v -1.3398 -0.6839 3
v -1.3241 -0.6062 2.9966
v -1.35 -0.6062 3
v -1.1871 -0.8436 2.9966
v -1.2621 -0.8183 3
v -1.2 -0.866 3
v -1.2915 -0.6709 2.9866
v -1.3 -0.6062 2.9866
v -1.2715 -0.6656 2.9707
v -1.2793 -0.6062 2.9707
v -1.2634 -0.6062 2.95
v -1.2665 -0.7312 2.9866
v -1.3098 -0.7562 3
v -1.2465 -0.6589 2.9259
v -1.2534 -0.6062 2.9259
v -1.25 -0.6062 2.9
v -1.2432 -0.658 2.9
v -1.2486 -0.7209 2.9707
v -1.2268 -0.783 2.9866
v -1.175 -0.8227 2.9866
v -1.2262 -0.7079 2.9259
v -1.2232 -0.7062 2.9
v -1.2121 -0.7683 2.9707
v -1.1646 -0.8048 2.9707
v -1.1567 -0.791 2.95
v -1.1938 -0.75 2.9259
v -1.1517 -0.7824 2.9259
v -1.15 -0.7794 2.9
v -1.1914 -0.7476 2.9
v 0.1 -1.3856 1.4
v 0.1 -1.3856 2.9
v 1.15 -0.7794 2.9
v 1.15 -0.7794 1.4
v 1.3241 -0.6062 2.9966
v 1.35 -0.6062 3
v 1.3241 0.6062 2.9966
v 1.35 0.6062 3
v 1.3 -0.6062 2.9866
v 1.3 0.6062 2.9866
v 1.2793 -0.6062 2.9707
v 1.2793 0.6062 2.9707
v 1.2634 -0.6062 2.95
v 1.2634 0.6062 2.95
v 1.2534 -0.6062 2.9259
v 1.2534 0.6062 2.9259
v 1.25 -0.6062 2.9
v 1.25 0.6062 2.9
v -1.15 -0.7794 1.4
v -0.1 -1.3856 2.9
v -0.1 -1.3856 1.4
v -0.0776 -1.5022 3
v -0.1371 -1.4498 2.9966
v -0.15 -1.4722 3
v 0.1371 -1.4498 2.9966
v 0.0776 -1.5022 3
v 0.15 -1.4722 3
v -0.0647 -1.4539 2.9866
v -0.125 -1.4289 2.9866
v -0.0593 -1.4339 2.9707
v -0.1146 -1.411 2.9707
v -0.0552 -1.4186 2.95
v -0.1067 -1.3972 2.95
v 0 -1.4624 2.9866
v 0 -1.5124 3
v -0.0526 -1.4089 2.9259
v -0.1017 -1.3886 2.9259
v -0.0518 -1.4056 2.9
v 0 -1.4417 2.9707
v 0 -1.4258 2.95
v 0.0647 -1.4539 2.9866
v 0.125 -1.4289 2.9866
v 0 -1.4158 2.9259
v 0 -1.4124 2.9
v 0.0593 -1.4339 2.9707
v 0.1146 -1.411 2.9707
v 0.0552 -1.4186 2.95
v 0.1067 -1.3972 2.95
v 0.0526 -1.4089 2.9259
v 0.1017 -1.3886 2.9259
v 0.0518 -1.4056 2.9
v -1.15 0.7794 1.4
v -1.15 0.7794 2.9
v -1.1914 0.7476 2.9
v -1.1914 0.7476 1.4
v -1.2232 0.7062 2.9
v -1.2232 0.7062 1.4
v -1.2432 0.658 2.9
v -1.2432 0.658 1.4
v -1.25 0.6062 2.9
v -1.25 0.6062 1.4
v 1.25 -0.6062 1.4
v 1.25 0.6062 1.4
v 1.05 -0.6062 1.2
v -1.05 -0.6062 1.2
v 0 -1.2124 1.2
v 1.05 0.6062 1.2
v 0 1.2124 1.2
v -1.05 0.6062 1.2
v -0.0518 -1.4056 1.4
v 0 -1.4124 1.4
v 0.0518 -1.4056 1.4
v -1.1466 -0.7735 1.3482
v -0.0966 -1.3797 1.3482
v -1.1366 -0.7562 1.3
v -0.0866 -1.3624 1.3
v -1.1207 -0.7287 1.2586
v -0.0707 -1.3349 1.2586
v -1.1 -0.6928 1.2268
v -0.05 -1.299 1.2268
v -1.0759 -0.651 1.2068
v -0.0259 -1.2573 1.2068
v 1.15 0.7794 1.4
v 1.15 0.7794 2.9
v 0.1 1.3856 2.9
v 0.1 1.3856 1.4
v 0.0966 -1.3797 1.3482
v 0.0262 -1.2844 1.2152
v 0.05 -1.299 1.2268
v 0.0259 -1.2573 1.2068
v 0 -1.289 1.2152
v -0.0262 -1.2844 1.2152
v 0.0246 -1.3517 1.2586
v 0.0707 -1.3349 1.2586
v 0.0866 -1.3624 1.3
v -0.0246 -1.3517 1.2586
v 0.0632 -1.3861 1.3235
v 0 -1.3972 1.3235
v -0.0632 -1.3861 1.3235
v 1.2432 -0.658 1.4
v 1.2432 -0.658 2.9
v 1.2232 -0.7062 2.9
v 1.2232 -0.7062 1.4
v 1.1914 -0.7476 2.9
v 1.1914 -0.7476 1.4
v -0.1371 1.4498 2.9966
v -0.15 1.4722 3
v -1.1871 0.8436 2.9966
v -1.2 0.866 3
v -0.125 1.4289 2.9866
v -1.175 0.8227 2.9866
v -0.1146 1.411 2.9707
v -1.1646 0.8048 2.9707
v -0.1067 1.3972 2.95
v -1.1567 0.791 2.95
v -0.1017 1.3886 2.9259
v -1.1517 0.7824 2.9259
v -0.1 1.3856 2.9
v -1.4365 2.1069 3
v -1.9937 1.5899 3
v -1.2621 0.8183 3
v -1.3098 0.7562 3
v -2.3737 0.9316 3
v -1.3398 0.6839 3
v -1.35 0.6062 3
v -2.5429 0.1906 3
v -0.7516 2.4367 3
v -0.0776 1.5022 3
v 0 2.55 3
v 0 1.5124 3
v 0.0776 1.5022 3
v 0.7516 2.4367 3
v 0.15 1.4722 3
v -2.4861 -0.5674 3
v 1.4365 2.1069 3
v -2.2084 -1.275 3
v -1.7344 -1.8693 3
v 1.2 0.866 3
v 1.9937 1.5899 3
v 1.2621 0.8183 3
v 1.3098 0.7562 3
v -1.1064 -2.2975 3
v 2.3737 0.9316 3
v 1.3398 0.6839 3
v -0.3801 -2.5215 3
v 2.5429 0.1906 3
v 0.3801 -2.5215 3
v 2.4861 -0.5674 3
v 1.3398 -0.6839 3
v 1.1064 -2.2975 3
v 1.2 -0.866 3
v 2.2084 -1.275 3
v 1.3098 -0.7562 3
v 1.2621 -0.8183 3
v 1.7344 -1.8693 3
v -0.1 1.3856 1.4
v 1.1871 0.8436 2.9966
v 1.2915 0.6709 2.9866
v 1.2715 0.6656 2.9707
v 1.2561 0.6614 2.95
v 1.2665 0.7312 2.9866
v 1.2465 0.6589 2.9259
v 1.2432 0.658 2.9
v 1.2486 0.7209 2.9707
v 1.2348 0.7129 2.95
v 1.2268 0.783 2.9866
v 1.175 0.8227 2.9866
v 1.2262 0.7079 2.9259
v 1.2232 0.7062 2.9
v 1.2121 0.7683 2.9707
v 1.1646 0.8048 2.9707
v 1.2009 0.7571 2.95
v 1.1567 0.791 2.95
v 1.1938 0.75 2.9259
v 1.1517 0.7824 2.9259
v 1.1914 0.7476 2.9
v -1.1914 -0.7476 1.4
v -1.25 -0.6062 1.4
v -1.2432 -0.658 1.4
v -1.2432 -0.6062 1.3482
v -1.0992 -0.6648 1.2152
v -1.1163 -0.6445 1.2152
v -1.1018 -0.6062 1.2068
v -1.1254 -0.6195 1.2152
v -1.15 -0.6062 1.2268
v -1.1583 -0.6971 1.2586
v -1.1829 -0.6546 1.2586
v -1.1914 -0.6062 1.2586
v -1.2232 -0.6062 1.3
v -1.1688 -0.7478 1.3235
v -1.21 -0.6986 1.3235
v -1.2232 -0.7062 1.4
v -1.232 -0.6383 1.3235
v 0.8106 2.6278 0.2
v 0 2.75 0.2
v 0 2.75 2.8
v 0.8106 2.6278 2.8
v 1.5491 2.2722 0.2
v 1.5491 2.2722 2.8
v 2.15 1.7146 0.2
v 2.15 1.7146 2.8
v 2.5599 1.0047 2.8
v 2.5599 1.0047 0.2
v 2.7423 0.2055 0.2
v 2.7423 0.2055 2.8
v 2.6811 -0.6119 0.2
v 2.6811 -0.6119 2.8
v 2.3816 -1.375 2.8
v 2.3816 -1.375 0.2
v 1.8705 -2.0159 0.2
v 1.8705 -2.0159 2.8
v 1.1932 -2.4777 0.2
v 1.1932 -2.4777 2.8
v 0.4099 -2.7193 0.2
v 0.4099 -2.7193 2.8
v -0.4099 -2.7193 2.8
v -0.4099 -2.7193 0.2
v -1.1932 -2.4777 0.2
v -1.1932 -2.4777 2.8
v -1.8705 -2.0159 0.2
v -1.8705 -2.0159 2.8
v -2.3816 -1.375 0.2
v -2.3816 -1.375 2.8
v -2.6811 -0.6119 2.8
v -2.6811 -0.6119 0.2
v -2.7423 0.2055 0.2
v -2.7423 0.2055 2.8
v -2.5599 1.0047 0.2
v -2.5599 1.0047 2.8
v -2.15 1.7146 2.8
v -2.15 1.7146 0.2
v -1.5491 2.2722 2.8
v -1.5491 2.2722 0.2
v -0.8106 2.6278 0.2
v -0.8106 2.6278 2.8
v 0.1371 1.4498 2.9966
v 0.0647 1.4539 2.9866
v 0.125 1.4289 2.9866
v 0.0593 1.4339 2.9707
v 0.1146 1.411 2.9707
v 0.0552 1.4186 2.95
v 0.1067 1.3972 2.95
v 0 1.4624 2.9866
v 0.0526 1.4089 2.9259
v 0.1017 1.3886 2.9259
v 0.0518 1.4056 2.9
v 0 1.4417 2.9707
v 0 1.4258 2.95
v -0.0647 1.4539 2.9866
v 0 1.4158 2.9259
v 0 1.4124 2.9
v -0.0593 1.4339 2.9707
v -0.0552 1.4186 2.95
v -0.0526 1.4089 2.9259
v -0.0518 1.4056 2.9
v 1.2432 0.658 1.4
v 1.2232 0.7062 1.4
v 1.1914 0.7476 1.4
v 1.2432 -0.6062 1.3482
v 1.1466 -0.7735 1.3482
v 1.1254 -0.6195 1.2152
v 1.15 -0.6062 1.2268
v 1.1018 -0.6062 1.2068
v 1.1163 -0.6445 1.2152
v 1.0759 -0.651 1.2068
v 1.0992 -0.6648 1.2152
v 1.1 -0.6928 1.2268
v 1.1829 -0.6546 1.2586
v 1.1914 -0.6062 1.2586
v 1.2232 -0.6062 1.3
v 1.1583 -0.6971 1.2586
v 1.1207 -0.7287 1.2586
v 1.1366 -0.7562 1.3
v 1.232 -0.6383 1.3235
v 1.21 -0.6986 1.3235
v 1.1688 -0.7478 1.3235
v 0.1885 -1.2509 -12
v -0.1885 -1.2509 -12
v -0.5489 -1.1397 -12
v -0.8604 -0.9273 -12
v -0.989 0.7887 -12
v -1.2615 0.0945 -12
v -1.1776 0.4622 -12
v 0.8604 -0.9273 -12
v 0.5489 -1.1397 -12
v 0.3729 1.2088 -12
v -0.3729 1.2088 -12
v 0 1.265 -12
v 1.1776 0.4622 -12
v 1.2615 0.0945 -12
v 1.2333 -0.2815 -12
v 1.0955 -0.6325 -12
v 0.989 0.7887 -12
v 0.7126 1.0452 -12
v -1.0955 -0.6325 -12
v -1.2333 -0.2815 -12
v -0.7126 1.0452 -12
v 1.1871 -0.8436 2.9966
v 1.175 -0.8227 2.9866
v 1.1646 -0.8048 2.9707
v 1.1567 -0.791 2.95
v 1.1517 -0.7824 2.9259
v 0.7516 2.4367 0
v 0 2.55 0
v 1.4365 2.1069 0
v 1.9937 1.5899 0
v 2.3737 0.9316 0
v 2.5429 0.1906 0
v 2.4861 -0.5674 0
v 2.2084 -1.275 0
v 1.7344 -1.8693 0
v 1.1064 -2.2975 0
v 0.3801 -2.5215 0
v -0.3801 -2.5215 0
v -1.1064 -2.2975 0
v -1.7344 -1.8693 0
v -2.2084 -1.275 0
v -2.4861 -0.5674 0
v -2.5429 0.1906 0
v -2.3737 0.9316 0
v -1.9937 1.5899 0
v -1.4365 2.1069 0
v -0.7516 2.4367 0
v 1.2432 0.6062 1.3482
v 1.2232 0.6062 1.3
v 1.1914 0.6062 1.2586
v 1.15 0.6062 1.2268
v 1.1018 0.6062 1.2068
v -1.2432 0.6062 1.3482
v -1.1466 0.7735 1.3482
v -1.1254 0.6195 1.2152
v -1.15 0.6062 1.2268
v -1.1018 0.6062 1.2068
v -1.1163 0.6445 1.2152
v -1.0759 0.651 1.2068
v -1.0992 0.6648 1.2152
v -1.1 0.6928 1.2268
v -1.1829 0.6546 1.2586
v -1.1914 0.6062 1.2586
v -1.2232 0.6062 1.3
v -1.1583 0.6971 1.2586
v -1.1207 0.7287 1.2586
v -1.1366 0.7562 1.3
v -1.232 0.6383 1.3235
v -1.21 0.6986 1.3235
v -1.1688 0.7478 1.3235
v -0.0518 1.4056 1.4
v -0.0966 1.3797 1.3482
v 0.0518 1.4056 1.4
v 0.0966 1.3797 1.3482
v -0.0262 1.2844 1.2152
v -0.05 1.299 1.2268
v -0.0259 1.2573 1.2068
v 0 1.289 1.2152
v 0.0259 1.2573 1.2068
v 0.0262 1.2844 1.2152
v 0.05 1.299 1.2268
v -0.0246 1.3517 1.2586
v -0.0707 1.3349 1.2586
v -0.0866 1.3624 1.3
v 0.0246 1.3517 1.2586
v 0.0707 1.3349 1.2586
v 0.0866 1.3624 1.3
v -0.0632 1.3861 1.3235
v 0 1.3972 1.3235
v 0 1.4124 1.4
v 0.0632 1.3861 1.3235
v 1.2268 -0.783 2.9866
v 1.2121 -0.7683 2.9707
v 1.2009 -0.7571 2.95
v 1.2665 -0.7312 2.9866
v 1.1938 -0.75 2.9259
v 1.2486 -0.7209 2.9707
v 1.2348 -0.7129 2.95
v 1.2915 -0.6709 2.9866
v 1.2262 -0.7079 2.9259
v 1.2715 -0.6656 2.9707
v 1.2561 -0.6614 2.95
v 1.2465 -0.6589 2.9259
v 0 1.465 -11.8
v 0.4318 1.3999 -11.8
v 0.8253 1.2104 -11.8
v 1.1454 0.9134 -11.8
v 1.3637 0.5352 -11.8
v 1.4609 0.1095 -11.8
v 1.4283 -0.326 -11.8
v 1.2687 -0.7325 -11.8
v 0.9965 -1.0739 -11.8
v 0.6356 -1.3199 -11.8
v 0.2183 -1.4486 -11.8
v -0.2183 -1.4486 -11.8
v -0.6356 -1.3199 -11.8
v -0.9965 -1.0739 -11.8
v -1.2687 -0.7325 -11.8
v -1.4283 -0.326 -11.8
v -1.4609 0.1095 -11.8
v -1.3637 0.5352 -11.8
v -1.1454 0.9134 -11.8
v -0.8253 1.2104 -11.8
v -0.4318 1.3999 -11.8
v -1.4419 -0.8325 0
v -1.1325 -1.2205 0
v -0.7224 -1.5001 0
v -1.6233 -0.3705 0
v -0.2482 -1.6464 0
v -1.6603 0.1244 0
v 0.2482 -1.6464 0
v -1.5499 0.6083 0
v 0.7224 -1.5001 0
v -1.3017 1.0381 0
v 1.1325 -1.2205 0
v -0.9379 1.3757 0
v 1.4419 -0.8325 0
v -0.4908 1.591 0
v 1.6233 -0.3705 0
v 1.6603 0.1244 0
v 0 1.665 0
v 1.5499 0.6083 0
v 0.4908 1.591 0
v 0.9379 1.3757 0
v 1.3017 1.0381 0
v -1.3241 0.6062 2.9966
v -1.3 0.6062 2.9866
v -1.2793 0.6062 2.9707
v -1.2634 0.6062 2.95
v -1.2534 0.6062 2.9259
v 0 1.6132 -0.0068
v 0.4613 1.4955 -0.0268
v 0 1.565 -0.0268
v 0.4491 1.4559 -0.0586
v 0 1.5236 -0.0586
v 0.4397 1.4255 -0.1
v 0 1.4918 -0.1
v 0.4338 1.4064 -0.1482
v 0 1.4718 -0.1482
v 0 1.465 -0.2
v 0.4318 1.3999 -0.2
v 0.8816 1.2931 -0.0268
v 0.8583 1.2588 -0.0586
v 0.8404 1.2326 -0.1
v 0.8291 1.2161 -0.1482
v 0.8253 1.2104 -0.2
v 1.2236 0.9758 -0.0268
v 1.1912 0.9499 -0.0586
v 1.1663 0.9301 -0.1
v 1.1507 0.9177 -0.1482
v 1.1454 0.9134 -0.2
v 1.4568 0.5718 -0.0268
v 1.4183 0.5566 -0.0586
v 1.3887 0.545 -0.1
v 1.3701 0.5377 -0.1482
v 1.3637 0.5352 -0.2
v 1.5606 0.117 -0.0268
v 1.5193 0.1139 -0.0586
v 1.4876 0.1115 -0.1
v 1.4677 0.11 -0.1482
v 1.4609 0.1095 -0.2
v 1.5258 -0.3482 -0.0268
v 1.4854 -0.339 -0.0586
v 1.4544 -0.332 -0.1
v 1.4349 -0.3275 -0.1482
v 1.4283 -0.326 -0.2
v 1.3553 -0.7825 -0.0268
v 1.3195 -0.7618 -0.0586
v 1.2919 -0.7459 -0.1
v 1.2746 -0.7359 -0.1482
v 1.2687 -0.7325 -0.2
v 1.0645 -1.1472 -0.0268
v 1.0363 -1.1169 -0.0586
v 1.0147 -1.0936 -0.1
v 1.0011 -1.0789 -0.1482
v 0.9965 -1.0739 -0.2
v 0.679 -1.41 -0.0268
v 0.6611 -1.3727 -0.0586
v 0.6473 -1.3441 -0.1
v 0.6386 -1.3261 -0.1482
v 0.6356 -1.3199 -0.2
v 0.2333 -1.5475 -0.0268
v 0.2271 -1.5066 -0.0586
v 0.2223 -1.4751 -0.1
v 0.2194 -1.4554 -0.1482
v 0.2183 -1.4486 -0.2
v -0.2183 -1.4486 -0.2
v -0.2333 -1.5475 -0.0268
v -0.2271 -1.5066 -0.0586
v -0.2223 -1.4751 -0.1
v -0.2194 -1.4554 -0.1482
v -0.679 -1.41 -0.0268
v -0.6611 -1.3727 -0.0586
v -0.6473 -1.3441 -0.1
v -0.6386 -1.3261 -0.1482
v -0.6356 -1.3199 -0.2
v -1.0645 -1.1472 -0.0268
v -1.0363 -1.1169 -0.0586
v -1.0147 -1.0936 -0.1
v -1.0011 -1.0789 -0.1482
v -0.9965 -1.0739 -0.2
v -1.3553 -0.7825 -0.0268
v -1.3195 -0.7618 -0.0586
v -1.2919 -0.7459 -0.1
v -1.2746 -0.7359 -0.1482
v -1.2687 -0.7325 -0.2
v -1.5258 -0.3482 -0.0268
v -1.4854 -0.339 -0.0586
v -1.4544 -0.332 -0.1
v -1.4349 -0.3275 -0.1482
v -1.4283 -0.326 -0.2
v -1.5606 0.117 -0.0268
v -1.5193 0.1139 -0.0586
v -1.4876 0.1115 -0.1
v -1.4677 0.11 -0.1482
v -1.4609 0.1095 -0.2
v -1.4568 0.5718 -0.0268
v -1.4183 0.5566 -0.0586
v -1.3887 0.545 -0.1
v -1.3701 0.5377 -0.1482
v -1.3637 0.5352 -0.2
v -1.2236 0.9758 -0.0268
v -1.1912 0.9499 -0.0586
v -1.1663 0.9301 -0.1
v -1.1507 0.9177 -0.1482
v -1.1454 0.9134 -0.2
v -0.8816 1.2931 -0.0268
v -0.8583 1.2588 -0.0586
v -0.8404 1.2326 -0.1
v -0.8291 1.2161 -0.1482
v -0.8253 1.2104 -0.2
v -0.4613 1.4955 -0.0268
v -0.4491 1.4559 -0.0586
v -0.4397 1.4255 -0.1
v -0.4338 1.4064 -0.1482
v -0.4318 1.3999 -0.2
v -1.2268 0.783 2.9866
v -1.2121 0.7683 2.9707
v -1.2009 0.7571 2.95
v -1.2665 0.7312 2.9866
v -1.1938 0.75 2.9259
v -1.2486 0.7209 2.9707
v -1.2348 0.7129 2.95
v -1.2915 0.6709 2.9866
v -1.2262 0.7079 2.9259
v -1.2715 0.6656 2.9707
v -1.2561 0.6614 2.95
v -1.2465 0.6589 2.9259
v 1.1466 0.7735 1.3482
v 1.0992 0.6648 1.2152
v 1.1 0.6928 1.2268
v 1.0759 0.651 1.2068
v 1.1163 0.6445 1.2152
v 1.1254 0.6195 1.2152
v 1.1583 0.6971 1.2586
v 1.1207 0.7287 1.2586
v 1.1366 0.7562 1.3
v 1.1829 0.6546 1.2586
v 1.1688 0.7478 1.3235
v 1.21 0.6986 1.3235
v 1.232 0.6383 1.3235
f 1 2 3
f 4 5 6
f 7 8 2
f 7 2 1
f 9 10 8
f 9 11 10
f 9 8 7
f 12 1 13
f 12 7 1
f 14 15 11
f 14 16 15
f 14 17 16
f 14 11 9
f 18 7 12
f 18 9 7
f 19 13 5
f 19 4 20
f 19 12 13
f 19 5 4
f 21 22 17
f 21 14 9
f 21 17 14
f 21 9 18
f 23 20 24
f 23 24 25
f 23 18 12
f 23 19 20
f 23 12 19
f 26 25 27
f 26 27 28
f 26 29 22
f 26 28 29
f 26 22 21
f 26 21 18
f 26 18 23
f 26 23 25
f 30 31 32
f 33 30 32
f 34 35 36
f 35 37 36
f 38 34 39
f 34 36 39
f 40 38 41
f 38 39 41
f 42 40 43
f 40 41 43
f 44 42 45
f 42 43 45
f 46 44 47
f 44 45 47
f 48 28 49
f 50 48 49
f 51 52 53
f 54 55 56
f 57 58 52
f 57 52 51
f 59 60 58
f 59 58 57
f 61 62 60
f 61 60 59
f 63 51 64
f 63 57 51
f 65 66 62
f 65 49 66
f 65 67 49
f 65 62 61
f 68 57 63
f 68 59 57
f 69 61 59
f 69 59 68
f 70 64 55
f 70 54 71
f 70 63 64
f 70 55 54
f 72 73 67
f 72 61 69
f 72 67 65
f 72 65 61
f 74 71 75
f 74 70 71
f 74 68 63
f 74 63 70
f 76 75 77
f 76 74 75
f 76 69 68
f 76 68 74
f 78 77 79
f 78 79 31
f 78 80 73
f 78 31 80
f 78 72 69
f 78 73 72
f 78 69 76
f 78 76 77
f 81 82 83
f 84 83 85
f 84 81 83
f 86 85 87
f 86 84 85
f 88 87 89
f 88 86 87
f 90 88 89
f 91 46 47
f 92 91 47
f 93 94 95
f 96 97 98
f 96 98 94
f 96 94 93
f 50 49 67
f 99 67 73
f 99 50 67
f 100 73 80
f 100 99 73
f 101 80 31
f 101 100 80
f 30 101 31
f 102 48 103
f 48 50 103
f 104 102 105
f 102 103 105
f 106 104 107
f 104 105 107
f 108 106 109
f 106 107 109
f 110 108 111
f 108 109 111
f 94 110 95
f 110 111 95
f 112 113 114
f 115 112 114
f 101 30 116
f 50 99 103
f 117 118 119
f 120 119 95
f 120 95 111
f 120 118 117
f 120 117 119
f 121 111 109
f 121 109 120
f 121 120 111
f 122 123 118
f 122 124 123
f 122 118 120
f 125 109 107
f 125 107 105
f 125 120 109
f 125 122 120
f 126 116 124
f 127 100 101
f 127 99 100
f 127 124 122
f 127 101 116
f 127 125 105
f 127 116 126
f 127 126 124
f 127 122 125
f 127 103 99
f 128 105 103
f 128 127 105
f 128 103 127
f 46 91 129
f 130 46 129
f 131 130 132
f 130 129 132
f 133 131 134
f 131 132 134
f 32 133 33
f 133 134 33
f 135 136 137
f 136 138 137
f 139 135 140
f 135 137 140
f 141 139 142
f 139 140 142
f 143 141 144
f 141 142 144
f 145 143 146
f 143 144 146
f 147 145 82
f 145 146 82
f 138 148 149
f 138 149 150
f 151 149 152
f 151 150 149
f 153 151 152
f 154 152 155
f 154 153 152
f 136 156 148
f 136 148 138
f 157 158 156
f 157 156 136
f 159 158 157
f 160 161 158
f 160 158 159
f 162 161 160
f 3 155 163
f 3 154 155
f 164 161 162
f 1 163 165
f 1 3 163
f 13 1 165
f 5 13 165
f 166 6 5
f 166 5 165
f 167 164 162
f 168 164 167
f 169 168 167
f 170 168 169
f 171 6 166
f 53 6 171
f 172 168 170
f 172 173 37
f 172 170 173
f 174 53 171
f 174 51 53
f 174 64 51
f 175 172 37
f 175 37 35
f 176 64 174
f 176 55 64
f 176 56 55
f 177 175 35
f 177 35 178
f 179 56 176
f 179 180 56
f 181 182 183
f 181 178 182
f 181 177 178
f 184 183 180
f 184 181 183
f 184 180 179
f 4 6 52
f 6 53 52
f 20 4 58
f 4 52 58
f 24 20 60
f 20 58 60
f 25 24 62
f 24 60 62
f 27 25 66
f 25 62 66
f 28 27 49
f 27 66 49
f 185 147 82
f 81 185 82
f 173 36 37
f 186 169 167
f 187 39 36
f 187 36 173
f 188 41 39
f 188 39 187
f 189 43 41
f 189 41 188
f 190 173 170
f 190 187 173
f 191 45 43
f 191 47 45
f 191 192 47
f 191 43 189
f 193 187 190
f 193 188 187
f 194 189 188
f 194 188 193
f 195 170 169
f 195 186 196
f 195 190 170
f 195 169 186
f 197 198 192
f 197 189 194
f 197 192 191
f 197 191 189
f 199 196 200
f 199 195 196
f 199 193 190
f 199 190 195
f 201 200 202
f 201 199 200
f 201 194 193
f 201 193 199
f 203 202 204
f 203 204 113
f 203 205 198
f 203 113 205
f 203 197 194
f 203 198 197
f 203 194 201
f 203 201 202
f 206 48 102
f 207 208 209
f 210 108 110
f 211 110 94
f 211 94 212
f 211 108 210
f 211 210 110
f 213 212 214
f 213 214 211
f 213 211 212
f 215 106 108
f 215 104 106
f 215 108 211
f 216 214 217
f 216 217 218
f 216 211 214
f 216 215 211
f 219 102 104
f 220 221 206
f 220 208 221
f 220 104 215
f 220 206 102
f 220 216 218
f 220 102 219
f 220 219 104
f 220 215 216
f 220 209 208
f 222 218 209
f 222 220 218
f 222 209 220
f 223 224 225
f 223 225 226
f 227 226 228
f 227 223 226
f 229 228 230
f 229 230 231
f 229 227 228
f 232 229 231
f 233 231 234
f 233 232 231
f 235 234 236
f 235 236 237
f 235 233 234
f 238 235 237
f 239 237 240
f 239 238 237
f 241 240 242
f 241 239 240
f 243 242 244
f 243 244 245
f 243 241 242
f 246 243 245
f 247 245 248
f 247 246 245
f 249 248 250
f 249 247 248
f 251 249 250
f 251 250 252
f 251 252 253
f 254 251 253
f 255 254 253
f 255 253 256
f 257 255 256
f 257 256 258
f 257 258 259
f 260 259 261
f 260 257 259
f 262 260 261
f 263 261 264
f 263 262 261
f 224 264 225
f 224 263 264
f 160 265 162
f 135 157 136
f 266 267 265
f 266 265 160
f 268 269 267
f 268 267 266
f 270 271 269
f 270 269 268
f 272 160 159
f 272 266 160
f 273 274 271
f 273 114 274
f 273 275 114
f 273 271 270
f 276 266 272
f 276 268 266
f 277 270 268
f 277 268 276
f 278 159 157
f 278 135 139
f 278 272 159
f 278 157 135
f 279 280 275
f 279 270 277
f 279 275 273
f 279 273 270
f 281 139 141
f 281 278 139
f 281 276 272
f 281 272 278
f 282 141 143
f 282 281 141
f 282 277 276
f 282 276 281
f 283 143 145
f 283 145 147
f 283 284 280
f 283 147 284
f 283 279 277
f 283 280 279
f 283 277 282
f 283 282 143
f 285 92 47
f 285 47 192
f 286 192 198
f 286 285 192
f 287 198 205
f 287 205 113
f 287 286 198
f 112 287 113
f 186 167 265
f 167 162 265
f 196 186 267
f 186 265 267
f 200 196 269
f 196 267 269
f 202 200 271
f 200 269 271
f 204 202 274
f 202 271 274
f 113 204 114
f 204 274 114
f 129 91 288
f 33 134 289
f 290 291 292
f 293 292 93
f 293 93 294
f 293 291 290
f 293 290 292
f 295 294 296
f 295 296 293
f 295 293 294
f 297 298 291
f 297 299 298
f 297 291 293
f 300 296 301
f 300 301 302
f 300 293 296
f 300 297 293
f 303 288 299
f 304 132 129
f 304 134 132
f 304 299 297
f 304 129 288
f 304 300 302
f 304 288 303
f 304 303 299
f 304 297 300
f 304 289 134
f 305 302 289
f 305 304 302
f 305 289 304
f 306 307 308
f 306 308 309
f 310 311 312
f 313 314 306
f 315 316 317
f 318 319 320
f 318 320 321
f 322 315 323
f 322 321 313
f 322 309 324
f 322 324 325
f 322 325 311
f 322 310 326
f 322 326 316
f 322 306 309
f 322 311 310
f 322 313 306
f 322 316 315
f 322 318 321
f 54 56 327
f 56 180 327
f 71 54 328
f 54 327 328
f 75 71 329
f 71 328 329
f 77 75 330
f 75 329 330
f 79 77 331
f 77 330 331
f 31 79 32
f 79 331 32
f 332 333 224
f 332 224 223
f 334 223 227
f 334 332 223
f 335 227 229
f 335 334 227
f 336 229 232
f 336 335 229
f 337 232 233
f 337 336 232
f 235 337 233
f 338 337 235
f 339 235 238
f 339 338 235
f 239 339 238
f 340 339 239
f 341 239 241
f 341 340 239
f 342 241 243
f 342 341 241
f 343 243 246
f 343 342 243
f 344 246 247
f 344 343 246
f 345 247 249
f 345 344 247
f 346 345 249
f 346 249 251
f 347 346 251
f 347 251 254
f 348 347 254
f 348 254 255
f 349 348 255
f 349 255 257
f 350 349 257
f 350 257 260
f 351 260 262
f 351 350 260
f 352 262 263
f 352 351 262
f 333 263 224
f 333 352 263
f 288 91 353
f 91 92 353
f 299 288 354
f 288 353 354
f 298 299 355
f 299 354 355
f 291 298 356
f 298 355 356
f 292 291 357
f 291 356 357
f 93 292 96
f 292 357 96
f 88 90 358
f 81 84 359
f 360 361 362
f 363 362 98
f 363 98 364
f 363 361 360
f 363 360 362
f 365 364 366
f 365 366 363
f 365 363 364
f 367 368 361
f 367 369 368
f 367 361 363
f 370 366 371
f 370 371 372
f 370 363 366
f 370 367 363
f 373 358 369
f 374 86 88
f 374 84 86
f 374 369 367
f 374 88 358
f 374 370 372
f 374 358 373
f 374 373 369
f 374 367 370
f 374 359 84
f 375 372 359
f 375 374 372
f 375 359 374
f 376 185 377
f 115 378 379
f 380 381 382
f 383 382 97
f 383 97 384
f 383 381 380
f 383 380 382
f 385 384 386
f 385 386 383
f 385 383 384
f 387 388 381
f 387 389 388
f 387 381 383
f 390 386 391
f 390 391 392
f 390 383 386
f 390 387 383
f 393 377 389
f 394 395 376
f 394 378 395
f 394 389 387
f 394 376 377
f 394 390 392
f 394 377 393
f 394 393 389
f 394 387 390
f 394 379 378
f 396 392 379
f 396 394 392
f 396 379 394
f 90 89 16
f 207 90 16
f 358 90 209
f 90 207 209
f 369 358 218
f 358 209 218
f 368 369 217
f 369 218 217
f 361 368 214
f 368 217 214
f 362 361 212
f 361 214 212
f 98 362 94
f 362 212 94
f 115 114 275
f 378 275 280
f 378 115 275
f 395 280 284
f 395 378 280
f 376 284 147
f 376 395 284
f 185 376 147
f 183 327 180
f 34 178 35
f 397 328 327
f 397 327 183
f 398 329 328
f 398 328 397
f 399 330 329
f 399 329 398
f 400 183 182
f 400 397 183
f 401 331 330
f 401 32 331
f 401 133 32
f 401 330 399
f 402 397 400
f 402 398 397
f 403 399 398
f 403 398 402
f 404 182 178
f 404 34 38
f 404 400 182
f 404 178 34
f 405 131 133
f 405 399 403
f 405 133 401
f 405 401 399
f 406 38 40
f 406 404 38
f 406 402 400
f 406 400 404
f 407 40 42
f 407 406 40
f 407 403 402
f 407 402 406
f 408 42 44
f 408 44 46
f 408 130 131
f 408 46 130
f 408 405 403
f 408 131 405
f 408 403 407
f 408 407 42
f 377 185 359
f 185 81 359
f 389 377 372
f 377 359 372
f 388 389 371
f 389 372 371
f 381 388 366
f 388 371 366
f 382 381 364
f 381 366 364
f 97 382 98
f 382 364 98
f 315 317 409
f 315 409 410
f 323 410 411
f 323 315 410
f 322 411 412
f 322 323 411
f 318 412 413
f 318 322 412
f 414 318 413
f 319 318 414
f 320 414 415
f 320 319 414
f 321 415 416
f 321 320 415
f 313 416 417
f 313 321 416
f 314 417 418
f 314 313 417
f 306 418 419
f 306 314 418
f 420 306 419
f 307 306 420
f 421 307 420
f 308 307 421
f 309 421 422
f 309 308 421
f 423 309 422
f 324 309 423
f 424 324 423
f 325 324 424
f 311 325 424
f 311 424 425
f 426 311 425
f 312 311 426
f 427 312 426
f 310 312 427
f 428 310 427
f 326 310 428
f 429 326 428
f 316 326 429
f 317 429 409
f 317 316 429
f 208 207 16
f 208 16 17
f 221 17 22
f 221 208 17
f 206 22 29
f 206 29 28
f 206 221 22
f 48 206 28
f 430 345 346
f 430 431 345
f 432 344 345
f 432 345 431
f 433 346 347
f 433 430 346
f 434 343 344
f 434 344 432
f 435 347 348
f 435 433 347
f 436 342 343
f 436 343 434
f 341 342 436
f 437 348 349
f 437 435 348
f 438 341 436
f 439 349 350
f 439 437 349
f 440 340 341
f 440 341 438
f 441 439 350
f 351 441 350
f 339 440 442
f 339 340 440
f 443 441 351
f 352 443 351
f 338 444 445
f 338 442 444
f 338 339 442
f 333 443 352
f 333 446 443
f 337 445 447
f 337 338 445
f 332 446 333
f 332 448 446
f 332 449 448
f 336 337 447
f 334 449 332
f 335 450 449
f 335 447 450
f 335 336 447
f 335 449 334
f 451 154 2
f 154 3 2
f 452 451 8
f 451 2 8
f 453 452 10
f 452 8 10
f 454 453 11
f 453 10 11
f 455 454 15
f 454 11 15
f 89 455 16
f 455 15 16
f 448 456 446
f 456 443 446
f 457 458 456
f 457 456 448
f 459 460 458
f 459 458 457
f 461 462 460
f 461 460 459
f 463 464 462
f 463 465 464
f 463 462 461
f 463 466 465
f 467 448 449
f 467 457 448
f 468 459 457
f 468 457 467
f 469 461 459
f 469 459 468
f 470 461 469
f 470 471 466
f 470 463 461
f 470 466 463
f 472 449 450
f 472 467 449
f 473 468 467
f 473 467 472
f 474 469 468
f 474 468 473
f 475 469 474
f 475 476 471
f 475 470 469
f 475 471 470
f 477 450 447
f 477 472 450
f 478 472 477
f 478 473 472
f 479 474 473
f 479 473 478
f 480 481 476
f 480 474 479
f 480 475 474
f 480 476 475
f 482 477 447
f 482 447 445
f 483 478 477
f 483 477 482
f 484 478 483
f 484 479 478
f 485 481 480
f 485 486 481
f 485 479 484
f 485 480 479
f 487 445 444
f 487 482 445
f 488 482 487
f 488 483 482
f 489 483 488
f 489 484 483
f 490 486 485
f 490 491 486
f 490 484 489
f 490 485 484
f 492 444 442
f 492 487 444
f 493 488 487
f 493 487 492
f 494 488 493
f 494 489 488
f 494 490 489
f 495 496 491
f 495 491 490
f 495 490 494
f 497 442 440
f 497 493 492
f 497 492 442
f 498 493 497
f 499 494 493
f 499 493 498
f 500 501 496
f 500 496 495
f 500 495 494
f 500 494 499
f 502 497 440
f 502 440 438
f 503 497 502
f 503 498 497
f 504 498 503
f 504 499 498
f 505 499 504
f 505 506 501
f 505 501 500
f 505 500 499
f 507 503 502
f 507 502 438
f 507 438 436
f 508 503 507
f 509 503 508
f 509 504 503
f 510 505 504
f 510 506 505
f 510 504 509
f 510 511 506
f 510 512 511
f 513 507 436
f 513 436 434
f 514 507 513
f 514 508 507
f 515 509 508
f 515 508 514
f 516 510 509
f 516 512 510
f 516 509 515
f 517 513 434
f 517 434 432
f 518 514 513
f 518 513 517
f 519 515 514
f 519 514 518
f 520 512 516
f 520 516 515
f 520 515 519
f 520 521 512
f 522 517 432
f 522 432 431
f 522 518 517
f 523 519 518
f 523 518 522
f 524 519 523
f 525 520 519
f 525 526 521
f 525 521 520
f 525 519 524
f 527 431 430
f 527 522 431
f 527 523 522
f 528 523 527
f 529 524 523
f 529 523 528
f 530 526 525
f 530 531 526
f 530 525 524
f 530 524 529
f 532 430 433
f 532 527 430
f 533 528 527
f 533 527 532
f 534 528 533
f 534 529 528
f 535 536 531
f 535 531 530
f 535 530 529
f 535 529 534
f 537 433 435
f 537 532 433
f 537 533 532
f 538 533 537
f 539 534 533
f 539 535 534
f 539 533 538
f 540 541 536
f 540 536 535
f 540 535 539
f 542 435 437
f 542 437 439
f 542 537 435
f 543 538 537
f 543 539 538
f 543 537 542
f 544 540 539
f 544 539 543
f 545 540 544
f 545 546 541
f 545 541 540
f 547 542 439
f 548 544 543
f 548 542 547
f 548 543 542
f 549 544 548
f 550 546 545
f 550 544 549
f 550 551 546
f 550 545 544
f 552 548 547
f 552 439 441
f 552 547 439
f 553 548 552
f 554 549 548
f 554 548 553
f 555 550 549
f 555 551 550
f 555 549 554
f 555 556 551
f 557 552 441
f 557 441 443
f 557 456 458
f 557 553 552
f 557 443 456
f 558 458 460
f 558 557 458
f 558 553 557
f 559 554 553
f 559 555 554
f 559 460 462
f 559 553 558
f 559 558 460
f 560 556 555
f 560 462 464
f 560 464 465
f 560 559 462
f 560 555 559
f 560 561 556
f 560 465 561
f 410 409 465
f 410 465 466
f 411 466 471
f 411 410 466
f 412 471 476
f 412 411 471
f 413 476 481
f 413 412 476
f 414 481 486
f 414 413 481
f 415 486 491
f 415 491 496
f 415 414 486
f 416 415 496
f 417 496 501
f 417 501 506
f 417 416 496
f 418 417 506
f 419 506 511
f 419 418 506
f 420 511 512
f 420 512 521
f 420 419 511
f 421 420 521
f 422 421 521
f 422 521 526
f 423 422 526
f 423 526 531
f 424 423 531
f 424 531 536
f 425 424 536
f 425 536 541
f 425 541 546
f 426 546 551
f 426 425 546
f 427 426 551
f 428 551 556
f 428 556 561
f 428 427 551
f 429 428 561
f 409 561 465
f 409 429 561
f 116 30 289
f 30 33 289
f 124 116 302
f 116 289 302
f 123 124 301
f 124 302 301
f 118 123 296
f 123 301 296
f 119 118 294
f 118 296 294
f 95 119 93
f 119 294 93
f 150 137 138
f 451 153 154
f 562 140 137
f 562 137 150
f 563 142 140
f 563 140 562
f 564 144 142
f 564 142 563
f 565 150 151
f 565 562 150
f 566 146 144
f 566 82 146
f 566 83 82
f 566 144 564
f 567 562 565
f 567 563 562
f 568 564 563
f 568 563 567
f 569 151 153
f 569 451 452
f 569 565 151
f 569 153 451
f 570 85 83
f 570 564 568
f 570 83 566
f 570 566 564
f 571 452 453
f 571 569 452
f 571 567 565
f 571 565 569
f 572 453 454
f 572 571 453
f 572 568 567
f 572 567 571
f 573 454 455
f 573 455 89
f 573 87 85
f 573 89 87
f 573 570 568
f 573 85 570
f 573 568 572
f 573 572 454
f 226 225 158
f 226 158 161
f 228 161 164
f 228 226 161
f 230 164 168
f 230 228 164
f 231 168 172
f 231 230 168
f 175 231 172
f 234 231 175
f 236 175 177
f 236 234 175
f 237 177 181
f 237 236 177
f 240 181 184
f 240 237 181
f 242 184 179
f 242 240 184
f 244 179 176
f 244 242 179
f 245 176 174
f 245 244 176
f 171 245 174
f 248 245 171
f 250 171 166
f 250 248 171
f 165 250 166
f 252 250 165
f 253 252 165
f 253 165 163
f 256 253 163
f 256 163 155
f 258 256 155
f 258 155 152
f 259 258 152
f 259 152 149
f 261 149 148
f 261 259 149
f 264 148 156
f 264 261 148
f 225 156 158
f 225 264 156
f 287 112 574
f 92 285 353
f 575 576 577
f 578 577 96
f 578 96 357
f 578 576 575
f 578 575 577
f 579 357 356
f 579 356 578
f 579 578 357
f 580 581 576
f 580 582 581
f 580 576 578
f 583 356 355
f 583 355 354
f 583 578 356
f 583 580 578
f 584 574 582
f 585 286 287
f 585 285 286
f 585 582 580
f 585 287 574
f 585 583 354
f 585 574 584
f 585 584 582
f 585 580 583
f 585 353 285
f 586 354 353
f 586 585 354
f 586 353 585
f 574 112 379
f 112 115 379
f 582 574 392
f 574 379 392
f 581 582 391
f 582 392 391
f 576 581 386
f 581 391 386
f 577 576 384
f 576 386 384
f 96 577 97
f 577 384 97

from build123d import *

# Parameters (mm, degrees)
SCHNITT_LINEAR_AUSTRAGEN1_DEPTH = 1.8
FASE1_SIZE                      = 0.2
VERRUNDUNG1_R                   = 0.2
VERRUNDUNG2_R                   = 0.1


with BuildPart() as part:
    # Skizze1 → Rotation1 (revolve)
    with BuildSketch(Plane(origin=(0, 0, 0), x_dir=(0, 0, -1), z_dir=(1, 0, 0))):
        Polygon((-3, 0), (-3, 2.75), (0, 2.75), (0, 1.465), (12, 1.465), (12, 0), align=None)
    revolve(axis=Axis((0, 0, 21.919879518), (0, 0, -1)))

    # Skizze2 → Schnitt-Linear austragen1 (cut)
    with BuildSketch(Plane.XY.offset(3)):
        Polygon((1.25, -0.721687836), (1.25, 0.721687836), (0, 1.443375673), (-1.25, 0.721687836), (-1.25, -0.721687836), (0, -1.443375673), align=None)
    extrude(amount=-SCHNITT_LINEAR_AUSTRAGEN1_DEPTH, mode=Mode.SUBTRACT)

    # Fase1
    fase1_edges = [part.edges().sort_by_distance(p)[0] for p in [
        (0, -1.465, -12),
        (0, -2.75, 0),
        (0, -2.75, 3),
    ]]
    chamfer(fase1_edges, length=FASE1_SIZE)

    # Verrundung1
    verrundung1_edges = [part.edges().sort_by_distance(p)[0] for p in [
        (0.625, -1.082531755, 1.2),
        (1.25, -0.721687836, 2.1),
        (-0.625, -1.082531755, 1.2),
        (0, -1.443375673, 2.1),
        (-1.25, 0, 1.2),
        (-1.25, -0.721687836, 2.1),
        (-0.625, 1.082531755, 1.2),
        (-1.25, 0.721687836, 2.1),
        (0.625, 1.082531755, 1.2),
        (0, 1.443375673, 2.1),
        (1.25, 0, 1.2),
        (1.25, 0.721687836, 2.1),
        (0, -1.465, 0),
    ]]
    fillet(verrundung1_edges, radius=VERRUNDUNG1_R)

    # Verrundung2
    verrundung2_edges = [part.edges().sort_by_distance(p)[0] for p in [
        (-0.625, -1.082531755, 3),
        (-1.25, 0, 3),
        (-0.625, 1.082531755, 3),
        (0.625, 1.082531755, 3),
        (1.25, 0, 3),
        (0.625, -1.082531755, 3),
        (-1.223205081, -0.706217783, 3),
        (0, -1.412435565, 3),
        (1.223205081, -0.706217783, 3),
        (1.223205081, 0.706217783, 3),
        (0, 1.412435565, 3),
        (-1.223205081, 0.706217783, 3),
    ]]
    fillet(verrundung2_edges, radius=VERRUNDUNG2_R)


solid = part.part
